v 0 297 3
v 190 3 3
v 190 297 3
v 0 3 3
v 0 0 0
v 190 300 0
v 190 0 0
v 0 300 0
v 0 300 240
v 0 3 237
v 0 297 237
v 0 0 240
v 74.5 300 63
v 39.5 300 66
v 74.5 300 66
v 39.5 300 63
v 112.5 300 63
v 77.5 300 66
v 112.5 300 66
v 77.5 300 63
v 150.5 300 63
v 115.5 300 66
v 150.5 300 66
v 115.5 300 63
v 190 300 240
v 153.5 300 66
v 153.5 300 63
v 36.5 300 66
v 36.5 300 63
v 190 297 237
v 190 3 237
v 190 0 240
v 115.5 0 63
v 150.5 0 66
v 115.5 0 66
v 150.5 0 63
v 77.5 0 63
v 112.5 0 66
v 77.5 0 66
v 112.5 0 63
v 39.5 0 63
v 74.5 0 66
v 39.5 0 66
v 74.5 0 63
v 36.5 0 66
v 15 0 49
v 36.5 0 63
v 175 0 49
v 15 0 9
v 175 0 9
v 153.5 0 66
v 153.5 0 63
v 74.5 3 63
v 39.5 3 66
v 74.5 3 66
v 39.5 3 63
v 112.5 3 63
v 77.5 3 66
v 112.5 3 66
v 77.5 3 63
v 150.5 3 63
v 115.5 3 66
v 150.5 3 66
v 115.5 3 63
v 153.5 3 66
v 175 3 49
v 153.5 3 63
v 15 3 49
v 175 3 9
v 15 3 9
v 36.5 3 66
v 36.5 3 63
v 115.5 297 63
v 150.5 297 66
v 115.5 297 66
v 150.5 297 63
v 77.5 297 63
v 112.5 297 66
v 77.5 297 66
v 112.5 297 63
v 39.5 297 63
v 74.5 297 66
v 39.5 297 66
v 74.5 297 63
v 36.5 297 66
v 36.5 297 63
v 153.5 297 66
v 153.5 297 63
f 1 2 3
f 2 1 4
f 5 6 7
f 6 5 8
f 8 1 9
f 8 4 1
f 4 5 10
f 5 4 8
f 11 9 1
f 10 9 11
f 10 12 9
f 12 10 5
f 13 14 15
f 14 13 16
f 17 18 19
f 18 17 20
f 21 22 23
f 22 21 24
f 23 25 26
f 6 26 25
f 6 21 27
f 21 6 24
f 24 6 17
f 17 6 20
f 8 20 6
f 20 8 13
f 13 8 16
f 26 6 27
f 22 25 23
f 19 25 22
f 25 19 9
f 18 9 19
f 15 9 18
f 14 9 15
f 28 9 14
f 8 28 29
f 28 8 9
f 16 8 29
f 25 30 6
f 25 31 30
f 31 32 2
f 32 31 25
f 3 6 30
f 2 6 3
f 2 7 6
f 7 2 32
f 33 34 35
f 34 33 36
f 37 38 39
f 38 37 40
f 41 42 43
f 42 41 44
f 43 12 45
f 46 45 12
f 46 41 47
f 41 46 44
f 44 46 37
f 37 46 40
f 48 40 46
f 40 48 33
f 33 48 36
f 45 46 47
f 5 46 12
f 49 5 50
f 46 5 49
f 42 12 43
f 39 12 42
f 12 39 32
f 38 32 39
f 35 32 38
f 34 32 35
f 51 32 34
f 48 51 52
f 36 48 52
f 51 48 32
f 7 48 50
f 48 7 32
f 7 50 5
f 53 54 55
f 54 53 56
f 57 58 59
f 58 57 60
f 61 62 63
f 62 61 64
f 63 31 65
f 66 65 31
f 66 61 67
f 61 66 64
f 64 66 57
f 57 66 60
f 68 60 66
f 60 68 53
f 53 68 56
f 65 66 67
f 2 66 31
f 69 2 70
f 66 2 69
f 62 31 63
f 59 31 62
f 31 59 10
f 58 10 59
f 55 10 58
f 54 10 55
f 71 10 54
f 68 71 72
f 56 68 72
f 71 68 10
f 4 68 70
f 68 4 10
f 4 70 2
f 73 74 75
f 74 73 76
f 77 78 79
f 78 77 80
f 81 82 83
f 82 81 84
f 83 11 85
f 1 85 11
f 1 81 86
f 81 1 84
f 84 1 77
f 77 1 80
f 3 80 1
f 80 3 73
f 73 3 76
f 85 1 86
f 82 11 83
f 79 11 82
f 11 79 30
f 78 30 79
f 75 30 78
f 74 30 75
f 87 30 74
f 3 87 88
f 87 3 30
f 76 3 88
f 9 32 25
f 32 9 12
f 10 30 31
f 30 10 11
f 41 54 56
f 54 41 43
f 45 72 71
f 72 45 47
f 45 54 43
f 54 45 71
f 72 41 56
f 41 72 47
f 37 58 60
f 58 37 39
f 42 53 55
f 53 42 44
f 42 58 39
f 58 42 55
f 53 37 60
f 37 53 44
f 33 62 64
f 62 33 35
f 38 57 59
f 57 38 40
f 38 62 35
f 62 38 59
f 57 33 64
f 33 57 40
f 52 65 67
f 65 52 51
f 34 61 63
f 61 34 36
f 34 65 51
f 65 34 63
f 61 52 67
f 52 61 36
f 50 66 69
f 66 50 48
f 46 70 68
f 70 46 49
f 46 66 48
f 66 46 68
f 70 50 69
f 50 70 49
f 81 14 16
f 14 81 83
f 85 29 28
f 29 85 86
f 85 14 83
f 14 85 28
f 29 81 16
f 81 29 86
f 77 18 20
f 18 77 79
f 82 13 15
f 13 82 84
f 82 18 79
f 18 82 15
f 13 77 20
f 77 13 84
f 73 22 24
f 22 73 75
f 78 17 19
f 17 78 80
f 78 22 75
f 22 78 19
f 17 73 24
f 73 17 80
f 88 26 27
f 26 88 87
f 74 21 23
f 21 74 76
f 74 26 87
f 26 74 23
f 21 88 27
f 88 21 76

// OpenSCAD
include <lasercut.scad>; 


length = 300;
width = 190;
h1 = 60;
h2 = 180;

thickness = 3.0;


height_total = h1 + h2;

n_inner_tabs = 4;
x_tab_space = width / (n_inner_tabs + 1);


bottom_hole_offset_x = 15;
bottom_hole_offset_h = thickness + 3;
bottom_hole_h = h1 - 20;


tab_inner_holes = [ for (i = [1 : n_inner_tabs]) [MID, i * x_tab_space - thickness/2, h1] ];


module stut()
{
    function tabs_inner(side, y) = [ for (i = [1 : n_inner_tabs]) [side, i * x_tab_space, y] ];

    tabs_right = tabs_inner(UP, length-thickness*2);
    tabs_left = tabs_inner(DOWN, 0);

    translate([0, thickness, thickness + h1])
    lasercutoutSquare(thickness=thickness, x=width, y=length-thickness*2, simple_tabs=concat(tabs_right, tabs_left)
    );
}


color("Gold",0.75)
lasercutoutBox(thickness=thickness, x=width, y=length, z=height_total, sides=4, num_fingers=4,
    simple_tab_holes_a=[
        [], [], tab_inner_holes, tab_inner_holes
    ],
    cutouts_a = [
        [], [], [[bottom_hole_offset_x, bottom_hole_offset_h, width - 2 * bottom_hole_offset_x, bottom_hole_h]]
    ]
);
%stut();
